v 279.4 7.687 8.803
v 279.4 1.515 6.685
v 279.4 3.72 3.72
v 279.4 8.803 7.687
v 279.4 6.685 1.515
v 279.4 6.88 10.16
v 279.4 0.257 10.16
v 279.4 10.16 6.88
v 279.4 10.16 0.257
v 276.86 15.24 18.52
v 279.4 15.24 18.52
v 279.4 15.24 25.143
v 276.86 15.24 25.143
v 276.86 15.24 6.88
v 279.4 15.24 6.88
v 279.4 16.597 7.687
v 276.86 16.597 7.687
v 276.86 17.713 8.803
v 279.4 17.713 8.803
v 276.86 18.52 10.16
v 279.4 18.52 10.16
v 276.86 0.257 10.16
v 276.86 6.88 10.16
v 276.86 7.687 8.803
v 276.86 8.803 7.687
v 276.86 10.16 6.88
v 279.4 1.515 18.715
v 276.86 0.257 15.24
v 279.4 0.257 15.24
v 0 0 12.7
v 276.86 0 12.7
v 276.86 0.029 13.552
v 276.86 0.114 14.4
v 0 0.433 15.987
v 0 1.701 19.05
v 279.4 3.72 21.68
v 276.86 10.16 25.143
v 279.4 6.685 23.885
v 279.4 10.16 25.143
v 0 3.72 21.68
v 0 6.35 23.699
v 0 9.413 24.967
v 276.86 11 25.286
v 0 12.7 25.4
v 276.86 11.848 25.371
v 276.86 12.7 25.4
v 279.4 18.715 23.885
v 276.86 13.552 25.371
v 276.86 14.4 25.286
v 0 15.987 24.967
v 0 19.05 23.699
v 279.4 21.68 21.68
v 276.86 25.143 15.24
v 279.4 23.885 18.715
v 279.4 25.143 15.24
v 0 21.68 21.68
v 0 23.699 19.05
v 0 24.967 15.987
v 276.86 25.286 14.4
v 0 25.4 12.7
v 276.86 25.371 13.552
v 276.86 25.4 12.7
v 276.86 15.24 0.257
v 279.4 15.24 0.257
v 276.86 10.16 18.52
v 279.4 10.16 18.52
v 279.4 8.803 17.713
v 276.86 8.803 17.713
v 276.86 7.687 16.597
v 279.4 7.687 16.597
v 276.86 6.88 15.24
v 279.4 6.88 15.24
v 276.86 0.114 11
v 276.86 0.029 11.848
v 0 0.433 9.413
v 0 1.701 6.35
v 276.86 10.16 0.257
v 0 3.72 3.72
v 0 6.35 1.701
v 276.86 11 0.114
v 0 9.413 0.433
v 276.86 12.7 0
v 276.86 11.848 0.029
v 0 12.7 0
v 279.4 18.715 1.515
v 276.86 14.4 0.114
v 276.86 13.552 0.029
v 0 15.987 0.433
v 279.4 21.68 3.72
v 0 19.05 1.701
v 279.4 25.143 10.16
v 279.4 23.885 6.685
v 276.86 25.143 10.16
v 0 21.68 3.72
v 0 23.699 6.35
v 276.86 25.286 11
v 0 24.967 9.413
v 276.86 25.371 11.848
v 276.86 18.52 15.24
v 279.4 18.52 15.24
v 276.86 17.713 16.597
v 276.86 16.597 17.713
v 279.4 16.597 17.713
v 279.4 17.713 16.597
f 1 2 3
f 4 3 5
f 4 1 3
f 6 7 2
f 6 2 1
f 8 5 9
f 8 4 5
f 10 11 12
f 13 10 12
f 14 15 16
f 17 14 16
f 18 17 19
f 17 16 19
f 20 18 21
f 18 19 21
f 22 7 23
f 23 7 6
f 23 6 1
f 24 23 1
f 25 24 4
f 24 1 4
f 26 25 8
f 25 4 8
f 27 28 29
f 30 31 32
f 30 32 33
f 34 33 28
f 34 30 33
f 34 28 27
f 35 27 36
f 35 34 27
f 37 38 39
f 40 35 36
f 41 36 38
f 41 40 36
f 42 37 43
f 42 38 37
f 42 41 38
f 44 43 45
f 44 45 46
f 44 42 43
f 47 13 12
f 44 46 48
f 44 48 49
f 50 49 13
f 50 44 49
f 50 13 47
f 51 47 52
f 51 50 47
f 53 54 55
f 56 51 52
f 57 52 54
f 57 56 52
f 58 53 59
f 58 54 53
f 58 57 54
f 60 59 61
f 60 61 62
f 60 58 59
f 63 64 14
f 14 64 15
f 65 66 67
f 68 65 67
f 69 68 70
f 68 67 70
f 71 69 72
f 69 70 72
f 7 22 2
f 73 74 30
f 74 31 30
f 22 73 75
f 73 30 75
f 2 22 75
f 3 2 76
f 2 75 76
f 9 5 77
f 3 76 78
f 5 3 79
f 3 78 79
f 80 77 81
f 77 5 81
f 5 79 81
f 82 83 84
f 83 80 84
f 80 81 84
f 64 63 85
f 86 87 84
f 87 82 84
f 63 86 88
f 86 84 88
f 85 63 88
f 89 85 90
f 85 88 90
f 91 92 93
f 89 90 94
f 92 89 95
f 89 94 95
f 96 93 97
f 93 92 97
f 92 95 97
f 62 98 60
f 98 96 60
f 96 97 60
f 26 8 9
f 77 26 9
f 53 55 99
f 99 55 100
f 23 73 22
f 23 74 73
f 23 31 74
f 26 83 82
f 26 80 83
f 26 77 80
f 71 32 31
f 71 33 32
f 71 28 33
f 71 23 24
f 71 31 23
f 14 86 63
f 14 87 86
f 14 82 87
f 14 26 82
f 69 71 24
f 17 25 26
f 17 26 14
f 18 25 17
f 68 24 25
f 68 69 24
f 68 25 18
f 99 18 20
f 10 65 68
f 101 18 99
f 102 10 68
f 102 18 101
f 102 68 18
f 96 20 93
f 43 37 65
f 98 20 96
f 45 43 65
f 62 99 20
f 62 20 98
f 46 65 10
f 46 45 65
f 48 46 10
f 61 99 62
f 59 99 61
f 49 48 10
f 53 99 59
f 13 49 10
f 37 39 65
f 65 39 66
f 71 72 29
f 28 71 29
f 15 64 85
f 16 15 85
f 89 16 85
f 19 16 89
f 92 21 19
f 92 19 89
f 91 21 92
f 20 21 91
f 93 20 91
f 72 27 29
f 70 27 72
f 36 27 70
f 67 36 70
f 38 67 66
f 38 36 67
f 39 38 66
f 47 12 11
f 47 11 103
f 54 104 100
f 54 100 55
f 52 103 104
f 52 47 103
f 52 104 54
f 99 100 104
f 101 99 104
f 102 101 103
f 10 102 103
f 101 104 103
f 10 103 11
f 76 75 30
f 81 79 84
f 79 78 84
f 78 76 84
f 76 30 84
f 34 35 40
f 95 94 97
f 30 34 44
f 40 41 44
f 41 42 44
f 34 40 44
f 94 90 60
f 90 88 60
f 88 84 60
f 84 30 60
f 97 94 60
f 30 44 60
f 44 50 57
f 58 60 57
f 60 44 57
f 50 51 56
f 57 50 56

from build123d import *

# Parameters (mm, degrees)
F0_W        = 25.4
F0_H        = 25.4
F1_DEPTH    = 279.4
F3_DEPTH    = 2.54
F4_T1_DEPTH = 342.9


# Not quite as in the source:
# - a fillet or chamfer that OpenCascade refuses, or shapes differently, is made with other operations: its cross-section is extruded or revolved along the edge and cut away or added


with BuildPart() as f1:
    # F0 (on Right) → F1 (new body)
    with BuildSketch(Plane.YZ):
        with Locations((12.7, 12.7)):
            Rectangle(F0_W, F0_H)
    extrude(amount=F1_DEPTH)

    # F2 (on face) → F3 (cut)
    with BuildSketch(Plane.YZ.offset(279.4)):
        with BuildLine():
            Line((15.24, 25.4), (12.7, 25.4))
            Line((12.7, 25.4), (12.7, 19.05))
            ThreePointArc((12.7, 19.05), (13.9973662374, 18.9160550871), (15.24, 18.5198711326))
            Line((15.24, 18.5198711326), (15.24, 25.4))
        make_face()
        with BuildLine():
            Line((12.7, 19.05), (12.7, 25.4))
            Line((12.7, 25.4), (10.16, 25.4))
            Line((10.16, 25.4), (10.16, 18.5198711326))
            ThreePointArc((10.16, 18.5198711326), (11.4026337626, 18.9160550871), (12.7, 19.05))
        make_face()
        with BuildLine():
            ThreePointArc((15.24, 18.5198711326), (13.9973662374, 18.9160550871), (12.7, 19.05))
            Line((12.7, 19.05), (12.7, 18.5198711326))
            Line((12.7, 18.5198711326), (15.24, 18.5198711326))
        make_face()
        with BuildLine():
            Line((12.7, 18.5198711326), (12.7, 19.05))
            ThreePointArc((12.7, 19.05), (11.4026337626, 18.9160550871), (10.16, 18.5198711326))
            Line((10.16, 18.5198711326), (12.7, 18.5198711326))
        make_face()
        with BuildLine():
            Line((15.24, 18.5198711326), (12.7, 18.5198711326))
            Line((12.7, 18.5198711326), (10.16, 18.5198711326))
            ThreePointArc((10.16, 18.5198711326), (8.2098719395, 17.1901280605), (6.8801288674, 15.24))
            ThreePointArc((6.8801288674, 15.24), (6.35, 12.7), (6.8801288674, 10.16))
            ThreePointArc((6.8801288674, 10.16), (8.2098719395, 8.2098719395), (10.16, 6.8801288674))
            Line((10.16, 6.8801288674), (15.24, 6.8801288674))
            ThreePointArc((15.24, 6.8801288674), (17.1901280605, 8.2098719395), (18.5198711326, 10.16))
            ThreePointArc((18.5198711326, 10.16), (18.9160550871, 11.4026337626), (19.05, 12.7))
            ThreePointArc((19.05, 12.7), (18.9160550871, 13.9973662374), (18.5198711326, 15.24))
            ThreePointArc((18.5198711326, 15.24), (17.1901280605, 17.1901280605), (15.24, 18.5198711326))
        make_face()
        with BuildLine():
            Line((25.4, 15.24), (18.5198711326, 15.24))
            ThreePointArc((18.5198711326, 15.24), (18.9160550871, 13.9973662374), (19.05, 12.7))
            ThreePointArc((19.05, 12.7), (18.9160550871, 11.4026337626), (18.5198711326, 10.16))
            Line((18.5198711326, 10.16), (25.4, 10.16))
            Line((25.4, 10.16), (25.4, 15.24))
        make_face()
        with BuildLine():
            ThreePointArc((6.8801288674, 10.16), (6.35, 12.7), (6.8801288674, 15.24))
            Line((6.8801288674, 15.24), (0, 15.24))
            Line((0, 15.24), (0, 10.16))
            Line((0, 10.16), (6.8801288674, 10.16))
        make_face()
        with BuildLine():
            Line((15.24, 6.8801288674), (10.16, 6.8801288674))
            ThreePointArc((10.16, 6.8801288674), (12.7, 6.35), (15.24, 6.8801288674))
        make_face()
        with BuildLine():
            ThreePointArc((15.24, 6.8801288674), (12.7, 6.35), (10.16, 6.8801288674))
            Line((10.16, 6.8801288674), (10.16, 0))
            Line((10.16, 0), (15.24, 0))
            Line((15.24, 0), (15.24, 6.8801288674))
        make_face()
    extrude(amount=-F3_DEPTH, mode=Mode.SUBTRACT)

    # F4: fillet of radius 12.7 on 4 edges, made by hand

    # F4_s2 → F4_t1 (cut)
    with BuildSketch(Plane.YZ.offset(-31.75)):
        with BuildLine():
            ThreePointArc((12.7, 25.4), (21.6802561211, 21.6802561211), (25.4, 12.7))
            Line((25.4, 12.7), (25.4, 25.4))
            Line((25.4, 25.4), (12.7, 25.4))
        make_face()
        with BuildLine():
            ThreePointArc((12.7, 0), (21.6802561211, 3.7197438789), (25.4, 12.7))
            Line((25.4, 12.7), (25.4, 0))
            Line((25.4, 0), (12.7, 0))
        make_face()
        with BuildLine():
            ThreePointArc((0, 12.7), (3.7197438789, 21.6802561211), (12.7, 25.4))
            Line((12.7, 25.4), (0, 25.4))
            Line((0, 25.4), (0, 12.7))
        make_face()
        with BuildLine():
            ThreePointArc((0, 12.7), (3.7197438789, 3.7197438789), (12.7, 0))
            Line((12.7, 0), (0, 0))
            Line((0, 0), (0, 12.7))
        make_face()
    extrude(amount=F4_T1_DEPTH, mode=Mode.SUBTRACT)


solid = f1.part
